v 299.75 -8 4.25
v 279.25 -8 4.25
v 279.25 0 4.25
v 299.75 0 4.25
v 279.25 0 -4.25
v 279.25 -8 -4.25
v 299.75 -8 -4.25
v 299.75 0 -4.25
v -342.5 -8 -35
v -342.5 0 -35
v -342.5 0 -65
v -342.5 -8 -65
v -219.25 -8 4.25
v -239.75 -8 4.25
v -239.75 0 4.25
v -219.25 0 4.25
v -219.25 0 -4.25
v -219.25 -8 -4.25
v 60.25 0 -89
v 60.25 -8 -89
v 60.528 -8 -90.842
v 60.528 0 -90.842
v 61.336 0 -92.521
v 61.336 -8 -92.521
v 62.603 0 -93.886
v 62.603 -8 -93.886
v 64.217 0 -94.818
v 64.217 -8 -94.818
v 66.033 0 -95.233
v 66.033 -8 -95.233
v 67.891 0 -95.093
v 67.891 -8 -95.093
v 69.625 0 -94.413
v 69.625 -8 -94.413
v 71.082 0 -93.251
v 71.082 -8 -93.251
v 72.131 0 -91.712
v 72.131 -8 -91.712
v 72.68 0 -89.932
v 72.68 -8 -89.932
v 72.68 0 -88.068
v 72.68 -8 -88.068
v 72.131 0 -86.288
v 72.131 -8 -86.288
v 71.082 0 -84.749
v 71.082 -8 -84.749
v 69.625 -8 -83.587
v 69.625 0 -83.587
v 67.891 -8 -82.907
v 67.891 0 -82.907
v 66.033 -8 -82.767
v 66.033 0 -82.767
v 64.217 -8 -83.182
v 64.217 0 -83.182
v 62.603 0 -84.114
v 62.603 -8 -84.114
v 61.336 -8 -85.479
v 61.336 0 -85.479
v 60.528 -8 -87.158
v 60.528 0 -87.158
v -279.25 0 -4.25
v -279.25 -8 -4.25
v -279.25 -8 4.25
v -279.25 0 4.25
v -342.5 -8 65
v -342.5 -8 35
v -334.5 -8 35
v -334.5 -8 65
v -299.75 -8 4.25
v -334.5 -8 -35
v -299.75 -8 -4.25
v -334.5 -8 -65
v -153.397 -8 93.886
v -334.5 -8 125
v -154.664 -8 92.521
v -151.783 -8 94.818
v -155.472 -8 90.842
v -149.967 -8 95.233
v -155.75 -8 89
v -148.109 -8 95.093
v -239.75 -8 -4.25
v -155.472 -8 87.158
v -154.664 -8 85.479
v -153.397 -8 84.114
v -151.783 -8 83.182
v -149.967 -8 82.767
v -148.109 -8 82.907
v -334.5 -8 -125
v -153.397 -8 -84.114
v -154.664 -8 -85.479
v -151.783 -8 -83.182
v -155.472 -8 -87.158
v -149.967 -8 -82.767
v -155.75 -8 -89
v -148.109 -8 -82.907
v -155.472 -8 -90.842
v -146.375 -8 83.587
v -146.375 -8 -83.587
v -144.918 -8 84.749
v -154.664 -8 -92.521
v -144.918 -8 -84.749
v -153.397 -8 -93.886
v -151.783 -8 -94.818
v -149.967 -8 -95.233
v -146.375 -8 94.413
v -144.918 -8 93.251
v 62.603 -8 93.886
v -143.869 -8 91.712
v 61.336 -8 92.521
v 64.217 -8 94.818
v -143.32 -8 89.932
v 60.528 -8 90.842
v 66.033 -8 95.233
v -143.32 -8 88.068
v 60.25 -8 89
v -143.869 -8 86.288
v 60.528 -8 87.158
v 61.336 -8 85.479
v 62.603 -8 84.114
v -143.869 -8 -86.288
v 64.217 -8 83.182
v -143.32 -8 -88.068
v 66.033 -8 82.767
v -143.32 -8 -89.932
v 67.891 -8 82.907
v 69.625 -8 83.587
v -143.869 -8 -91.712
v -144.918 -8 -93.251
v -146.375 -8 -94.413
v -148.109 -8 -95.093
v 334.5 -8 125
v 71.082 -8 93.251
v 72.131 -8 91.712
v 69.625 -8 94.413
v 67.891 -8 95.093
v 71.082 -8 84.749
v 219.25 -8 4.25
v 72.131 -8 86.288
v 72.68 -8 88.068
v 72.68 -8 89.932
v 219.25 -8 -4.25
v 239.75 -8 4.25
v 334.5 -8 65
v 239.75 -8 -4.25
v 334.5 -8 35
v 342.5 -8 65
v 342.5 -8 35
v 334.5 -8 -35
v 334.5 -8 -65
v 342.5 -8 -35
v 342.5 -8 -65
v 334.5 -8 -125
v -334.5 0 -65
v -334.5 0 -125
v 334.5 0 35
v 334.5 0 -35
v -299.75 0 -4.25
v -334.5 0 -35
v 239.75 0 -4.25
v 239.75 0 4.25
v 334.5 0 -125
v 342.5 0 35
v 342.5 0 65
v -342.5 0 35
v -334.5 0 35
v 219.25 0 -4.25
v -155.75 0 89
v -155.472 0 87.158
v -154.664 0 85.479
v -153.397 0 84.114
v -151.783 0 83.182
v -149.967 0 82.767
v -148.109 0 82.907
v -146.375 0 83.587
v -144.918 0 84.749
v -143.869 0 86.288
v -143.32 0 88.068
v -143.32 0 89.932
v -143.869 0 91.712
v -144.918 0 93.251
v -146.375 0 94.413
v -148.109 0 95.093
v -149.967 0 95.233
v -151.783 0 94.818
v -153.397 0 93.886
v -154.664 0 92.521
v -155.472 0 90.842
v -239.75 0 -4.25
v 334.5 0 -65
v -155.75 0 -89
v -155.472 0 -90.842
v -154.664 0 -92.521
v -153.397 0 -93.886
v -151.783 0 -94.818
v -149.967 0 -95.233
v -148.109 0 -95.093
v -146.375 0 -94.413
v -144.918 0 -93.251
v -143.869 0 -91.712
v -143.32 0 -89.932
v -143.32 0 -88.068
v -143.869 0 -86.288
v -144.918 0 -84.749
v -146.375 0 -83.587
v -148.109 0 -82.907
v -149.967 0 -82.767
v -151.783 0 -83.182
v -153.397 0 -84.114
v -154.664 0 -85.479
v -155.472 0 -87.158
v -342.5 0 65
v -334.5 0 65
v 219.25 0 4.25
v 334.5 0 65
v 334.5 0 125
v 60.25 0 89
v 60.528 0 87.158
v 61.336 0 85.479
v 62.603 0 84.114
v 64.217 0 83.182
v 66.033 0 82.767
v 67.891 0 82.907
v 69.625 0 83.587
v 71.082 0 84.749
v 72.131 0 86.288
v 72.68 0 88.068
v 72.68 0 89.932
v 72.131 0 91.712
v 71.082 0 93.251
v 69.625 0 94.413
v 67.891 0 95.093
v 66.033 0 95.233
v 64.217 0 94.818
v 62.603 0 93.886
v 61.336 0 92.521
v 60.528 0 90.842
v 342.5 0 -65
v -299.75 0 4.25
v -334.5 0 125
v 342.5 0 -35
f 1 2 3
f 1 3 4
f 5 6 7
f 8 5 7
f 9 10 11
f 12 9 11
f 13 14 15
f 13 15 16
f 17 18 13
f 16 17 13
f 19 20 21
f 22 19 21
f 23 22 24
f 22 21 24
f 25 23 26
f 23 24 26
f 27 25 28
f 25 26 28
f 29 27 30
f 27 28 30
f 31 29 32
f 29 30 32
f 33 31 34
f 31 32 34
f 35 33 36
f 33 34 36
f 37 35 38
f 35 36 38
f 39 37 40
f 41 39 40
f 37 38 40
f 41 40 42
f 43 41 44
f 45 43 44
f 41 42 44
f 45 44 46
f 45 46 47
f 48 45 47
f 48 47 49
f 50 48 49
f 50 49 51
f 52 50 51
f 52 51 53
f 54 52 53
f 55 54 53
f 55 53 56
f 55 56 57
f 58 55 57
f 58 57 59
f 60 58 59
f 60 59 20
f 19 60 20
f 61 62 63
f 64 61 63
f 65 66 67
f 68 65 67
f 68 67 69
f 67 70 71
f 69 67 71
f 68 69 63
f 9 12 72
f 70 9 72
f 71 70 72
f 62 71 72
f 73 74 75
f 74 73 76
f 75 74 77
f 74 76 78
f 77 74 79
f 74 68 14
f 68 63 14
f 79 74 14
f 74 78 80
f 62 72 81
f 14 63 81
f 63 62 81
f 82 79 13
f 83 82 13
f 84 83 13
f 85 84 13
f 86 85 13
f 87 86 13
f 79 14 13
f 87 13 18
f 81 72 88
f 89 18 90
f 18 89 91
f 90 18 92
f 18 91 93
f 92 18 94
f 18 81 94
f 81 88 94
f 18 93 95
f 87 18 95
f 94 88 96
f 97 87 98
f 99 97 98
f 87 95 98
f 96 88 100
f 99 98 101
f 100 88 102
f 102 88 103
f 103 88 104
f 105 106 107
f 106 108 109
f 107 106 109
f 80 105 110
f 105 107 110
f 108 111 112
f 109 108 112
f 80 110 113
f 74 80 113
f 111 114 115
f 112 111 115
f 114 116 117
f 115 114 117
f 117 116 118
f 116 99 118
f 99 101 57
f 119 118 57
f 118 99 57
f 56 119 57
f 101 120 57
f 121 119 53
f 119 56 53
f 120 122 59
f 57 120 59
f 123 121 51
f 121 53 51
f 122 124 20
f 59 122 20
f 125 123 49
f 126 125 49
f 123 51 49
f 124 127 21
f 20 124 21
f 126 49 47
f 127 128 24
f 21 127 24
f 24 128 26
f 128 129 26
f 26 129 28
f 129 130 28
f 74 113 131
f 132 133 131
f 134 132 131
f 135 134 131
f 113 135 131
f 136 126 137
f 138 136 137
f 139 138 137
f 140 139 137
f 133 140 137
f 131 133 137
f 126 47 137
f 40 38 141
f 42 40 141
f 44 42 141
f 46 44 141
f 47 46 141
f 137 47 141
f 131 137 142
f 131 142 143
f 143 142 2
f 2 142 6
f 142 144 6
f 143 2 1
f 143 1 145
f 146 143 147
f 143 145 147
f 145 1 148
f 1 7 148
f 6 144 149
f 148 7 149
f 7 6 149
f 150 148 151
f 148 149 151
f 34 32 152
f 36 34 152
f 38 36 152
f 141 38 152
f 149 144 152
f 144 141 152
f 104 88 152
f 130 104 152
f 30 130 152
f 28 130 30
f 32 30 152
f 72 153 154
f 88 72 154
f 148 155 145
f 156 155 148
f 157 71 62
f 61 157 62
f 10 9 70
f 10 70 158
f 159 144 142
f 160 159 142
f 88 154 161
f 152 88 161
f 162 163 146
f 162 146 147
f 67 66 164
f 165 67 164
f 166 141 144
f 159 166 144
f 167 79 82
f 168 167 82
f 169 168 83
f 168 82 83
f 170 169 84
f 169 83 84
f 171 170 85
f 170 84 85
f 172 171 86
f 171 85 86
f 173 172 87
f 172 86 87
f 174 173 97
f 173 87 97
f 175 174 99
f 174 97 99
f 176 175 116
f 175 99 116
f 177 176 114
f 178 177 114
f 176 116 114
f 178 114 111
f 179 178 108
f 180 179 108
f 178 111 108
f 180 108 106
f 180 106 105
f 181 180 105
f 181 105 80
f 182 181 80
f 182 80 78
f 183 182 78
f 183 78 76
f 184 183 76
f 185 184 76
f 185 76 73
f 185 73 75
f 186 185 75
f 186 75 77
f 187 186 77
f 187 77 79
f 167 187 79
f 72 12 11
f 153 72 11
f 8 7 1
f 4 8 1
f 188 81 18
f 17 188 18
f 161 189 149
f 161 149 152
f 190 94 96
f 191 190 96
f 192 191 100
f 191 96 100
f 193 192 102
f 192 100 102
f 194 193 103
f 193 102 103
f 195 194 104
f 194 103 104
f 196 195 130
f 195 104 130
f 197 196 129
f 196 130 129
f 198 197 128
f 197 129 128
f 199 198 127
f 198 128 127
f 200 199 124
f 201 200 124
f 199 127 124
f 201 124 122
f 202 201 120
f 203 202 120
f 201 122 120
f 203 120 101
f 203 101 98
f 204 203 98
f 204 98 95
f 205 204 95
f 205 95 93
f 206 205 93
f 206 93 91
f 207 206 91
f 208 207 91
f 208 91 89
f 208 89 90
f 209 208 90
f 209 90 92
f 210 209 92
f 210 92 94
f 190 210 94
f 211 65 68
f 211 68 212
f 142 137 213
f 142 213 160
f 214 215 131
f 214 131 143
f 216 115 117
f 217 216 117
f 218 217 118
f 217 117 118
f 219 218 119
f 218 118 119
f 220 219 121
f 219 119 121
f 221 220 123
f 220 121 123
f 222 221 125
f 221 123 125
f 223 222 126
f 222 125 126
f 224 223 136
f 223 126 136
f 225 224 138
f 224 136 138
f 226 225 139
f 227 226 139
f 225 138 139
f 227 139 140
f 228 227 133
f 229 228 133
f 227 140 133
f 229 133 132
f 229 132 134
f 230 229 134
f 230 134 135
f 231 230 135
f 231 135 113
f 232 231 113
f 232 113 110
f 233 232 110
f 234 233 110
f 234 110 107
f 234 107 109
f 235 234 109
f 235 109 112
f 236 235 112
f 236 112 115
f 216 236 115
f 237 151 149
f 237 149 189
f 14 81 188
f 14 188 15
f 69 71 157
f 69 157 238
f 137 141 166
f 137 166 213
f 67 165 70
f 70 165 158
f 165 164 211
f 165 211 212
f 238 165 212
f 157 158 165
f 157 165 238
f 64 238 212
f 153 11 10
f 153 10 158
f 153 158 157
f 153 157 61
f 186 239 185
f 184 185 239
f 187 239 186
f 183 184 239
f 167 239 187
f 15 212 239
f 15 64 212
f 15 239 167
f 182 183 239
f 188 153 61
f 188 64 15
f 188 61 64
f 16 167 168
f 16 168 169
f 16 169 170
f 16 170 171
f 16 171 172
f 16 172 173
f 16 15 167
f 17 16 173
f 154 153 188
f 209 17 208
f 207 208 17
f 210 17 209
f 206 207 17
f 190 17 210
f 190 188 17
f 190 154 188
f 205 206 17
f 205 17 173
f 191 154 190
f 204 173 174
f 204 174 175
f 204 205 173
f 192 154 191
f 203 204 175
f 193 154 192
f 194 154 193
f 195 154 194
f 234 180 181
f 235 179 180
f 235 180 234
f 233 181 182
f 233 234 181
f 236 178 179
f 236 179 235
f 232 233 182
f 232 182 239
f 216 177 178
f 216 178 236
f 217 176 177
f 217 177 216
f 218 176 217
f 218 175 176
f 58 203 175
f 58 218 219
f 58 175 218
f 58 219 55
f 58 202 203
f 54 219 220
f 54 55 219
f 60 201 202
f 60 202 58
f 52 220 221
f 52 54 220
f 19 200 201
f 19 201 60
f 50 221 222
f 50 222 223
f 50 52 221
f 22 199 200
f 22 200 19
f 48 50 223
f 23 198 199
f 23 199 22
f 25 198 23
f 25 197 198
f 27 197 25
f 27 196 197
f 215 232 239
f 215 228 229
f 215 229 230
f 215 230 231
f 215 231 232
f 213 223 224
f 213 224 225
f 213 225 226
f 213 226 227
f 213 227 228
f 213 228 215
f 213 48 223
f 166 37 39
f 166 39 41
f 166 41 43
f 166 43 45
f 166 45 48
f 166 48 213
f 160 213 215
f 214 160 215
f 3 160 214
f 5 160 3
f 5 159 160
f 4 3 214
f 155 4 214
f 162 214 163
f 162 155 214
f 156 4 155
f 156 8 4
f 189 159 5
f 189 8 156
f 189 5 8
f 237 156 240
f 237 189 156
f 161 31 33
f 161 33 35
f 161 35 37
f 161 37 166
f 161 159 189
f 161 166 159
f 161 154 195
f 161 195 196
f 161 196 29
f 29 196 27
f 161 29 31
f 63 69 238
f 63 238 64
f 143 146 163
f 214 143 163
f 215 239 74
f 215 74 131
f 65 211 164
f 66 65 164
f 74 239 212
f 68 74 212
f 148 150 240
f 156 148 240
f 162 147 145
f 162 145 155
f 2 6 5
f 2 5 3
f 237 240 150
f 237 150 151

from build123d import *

# Parameters (mm, degrees)
SKETCH1_W                        = 685
SKETCH1_H                        = 250
BASE_FLANGE1_DEPTH               = 8
SKETCH6_W                        = 60
SKETCH6_H                        = 8
SKETCH6_W_2                      = 70
EXTRUDE1_DEPTH                   = 8
SKETCH7_W                        = 250
SKETCH7_H                        = 73.5
BASE_FLANGE2_DEPTH               = 8
SKETCH12_W                       = 30.5
SKETCH12_H                       = 8.5
EXTRUDE2_DEPTH                   = 699.681794525
SKETCH14_W                       = 250
SKETCH14_H                       = 8
BASE_FLANGE3_DEPTH               = 50.5
SKETCH19_W                       = 60
SKETCH19_H                       = 8
SKETCH19_W_2                     = 70
EXTRUDE3_DEPTH                   = 8
BREAK_CORNER1_START              = 41.5
BREAK_CORNER1_DEPTH              = 8
EXTRUDE4_DEPTH                   = 8
BASE_FLANGE4_DEPTH               = 8
SKETCH38_W                       = 8.5
SKETCH38_H                       = 20.5
EXTRUDE5_DEPTH                   = 10
SKETCH39_W                       = 20.5
SKETCH39_H                       = 8.5
EXTRUDE6_DEPTH                   = 10
F_12_5_12_5_DIAMETER_HOLE1_D     = 12.5
F_12_5_12_5_DIAMETER_HOLE1_DEPTH = 10
F_12_5_12_5_DIAMETER_HOLE1_TIP   = 3.755378869


# Read off the part's stored shape, not the designer's step: Break-Corner1
# Sheet-metal steps are written as plain solids
with BuildPart() as part:
    # Sketch1 → Base-Flange1 (new body)
    with BuildSketch(Plane(origin=(0, 0, 0), x_dir=(1, 0, 0), z_dir=(0, 1, 0))):
        Rectangle(SKETCH1_W, SKETCH1_H)
    extrude(amount=-BASE_FLANGE1_DEPTH)

    # Sketch6 → Extrude1 (cut)
    with BuildSketch(Plane(origin=(342.5, 0, 0), x_dir=(0, 0, -1), z_dir=(1, 0, 0))):
        with Locations((-95, -4)):
            Rectangle(SKETCH6_W, SKETCH6_H)
        with Locations((95, -4)):
            Rectangle(SKETCH6_W, SKETCH6_H)
        with Locations((0, -4)):
            Rectangle(SKETCH6_W_2, SKETCH6_H)
    extrude1 = extrude(amount=-EXTRUDE1_DEPTH, mode=Mode.SUBTRACT)

    # Mirror1: Extrude1 across plane
    add(extrude1.mirror(Plane(origin=(0, 0, 0), x_dir=(0, 0, 1), z_dir=(1, 0, 0))), mode=Mode.SUBTRACT)

    # Sketch39 → Extrude6 (cut)
    with BuildSketch(Plane.XZ.offset(8)):
        with Locations((289.5, 0)):
            Rectangle(SKETCH39_W, SKETCH39_H)
        with Locations((229.5, 0)):
            Rectangle(SKETCH39_W, SKETCH39_H)
        with Locations((-289.5, 0)):
            Rectangle(SKETCH39_W, SKETCH39_H)
        with Locations((-229.5, 0)):
            Rectangle(SKETCH39_W, SKETCH39_H)
    extrude(amount=-EXTRUDE6_DEPTH, mode=Mode.SUBTRACT)

    # Ø12.5 (12.5) Diameter Hole1
    with Locations(Plane(origin=(131.975, 0, 2029.150100001), x_dir=(1, 0, 0), z_dir=(0, 1, 0))):
        with Locations((-281.475, 2118.150100001), (-281.475, 1940.150100001), (-65.475, 1940.150100001), (-65.475, 2118.150100001)):
            Hole(F_12_5_12_5_DIAMETER_HOLE1_D / 2, depth=F_12_5_12_5_DIAMETER_HOLE1_DEPTH)
            with Locations((0, 0, -(F_12_5_12_5_DIAMETER_HOLE1_DEPTH + F_12_5_12_5_DIAMETER_HOLE1_TIP / 2))):  # 118° drill point
                Cone(0, F_12_5_12_5_DIAMETER_HOLE1_D / 2, F_12_5_12_5_DIAMETER_HOLE1_TIP, mode=Mode.SUBTRACT)


with BuildPart() as body_2:
    # Sketch7 → Base-Flange2 (new body)
    with BuildSketch(Plane(origin=(334.5, 0, 0), x_dir=(0, 0, -1), z_dir=(1, 0, 0))):
        with Locations((0, 20.75)):
            Rectangle(SKETCH7_W, SKETCH7_H)
    extrude(amount=BASE_FLANGE2_DEPTH)

    # Sketch12 → Extrude2 (cut, through all)
    with BuildSketch(Plane(origin=(342.5, 0, 0), x_dir=(0, 0, -1), z_dir=(1, 0, 0))):
        with Locations((-50, -4)):
            Rectangle(SKETCH12_W, SKETCH12_H)
        with Locations((50, -4)):
            Rectangle(SKETCH12_W, SKETCH12_H)
        with Locations((50, 45.5)):
            Rectangle(SKETCH12_W, SKETCH12_H)
        with Locations((-50, 45.5)):
            Rectangle(SKETCH12_W, SKETCH12_H)
    extrude(amount=-EXTRUDE2_DEPTH, mode=Mode.SUBTRACT)

    # Sketch38 → Extrude5 (cut)
    with BuildSketch(Plane(origin=(342.5, 0, 0), x_dir=(0, 0, -1), z_dir=(1, 0, 0))):
        with Locations((0, 27.5)):
            Rectangle(SKETCH38_W, SKETCH38_H)
    extrude(amount=-EXTRUDE5_DEPTH, mode=Mode.SUBTRACT)


with BuildPart() as body_3:
    # Sketch14 → Base-Flange3 (new body)
    with BuildSketch(Plane.ZY.offset(-334.5)):
        with Locations((0, 45.5)):
            Rectangle(SKETCH14_W, SKETCH14_H)
    extrude(amount=-BASE_FLANGE3_DEPTH)

    # Sketch19 → Extrude3 (cut)
    with BuildSketch(Plane(origin=(342.5, 0, 0), x_dir=(0, 0, -1), z_dir=(1, 0, 0))):
        with Locations((95, 45.5)):
            Rectangle(SKETCH19_W, SKETCH19_H)
        with Locations((0, 45.5)):
            Rectangle(SKETCH19_W_2, SKETCH19_H)
        with Locations((-95, 45.5)):
            Rectangle(SKETCH19_W, SKETCH19_H)
    extrude(amount=-EXTRUDE3_DEPTH, mode=Mode.SUBTRACT)

    # Break-Corner1 outline → Break-Corner1 (cut)
    with BuildSketch(Plane(origin=(0, 0, 0), x_dir=(1, 0, 0), z_dir=(0, 1, 0)).offset(BREAK_CORNER1_START)):
        Polygon((385, -125), (385, -110), (370, -125), align=None)
        Polygon((370, 125), (385, 110), (385, 125), align=None)
    extrude(amount=BREAK_CORNER1_DEPTH, mode=Mode.SUBTRACT)

    # Sketch20 → Extrude4 (cut)
    with BuildSketch(Plane(origin=(0, 49.5, 0), x_dir=(1, 0, 0), z_dir=(0, 1, 0))):
        with BuildLine():
            Line((367, 75), (367, 55))
            ThreePointArc((367, 55), (362.5, 50.5), (358, 55))
            Line((358, 55), (358, 75))
            ThreePointArc((358, 75), (362.5, 79.5), (367, 75))
        make_face()
        with BuildLine():
            Line((367, -75), (367, -55))
            ThreePointArc((367, -55), (362.5, -50.5), (358, -55))
            Line((358, -55), (358, -75))
            ThreePointArc((358, -75), (362.5, -79.5), (367, -75))
        make_face()
    extrude(amount=-EXTRUDE4_DEPTH, mode=Mode.SUBTRACT)


with BuildPart() as body_4:
    # Mirror4: mirrored copy
    add(body_3.part.mirror(Plane(origin=(0, 0, 0), x_dir=(0, 0, 1), z_dir=(1, 0, 0))))


with BuildPart() as body_5:
    # Sketch29 → Base-Flange4 (new body)
    with BuildSketch(Plane.XY.offset(4)):
        Polygon((219.5, 0), (219.5, -8), (239.5, -8), (239.5, 0), (279.5, 0), (279.5, -8), (299.5, -8), (299.5, 0), (334.5, 0), (334.5, 17.5), (342.5, 17.5), (342.5, 37.5), (334.5, 37.5), (334.5, 57.5), (194.5, 10), (194.5, 0), align=None)
    extrude(amount=-BASE_FLANGE4_DEPTH)


with BuildPart() as body_6:
    # Mirror5: mirrored copy
    add(body_5.part.mirror(Plane(origin=(0, 0, 0), x_dir=(0, 0, 1), z_dir=(1, 0, 0))))


with BuildPart() as body_7:
    # Mirror3: mirrored copy
    add(body_2.part.mirror(Plane(origin=(0, 0, 0), x_dir=(0, 0, 1), z_dir=(1, 0, 0))))


solid = part.part
